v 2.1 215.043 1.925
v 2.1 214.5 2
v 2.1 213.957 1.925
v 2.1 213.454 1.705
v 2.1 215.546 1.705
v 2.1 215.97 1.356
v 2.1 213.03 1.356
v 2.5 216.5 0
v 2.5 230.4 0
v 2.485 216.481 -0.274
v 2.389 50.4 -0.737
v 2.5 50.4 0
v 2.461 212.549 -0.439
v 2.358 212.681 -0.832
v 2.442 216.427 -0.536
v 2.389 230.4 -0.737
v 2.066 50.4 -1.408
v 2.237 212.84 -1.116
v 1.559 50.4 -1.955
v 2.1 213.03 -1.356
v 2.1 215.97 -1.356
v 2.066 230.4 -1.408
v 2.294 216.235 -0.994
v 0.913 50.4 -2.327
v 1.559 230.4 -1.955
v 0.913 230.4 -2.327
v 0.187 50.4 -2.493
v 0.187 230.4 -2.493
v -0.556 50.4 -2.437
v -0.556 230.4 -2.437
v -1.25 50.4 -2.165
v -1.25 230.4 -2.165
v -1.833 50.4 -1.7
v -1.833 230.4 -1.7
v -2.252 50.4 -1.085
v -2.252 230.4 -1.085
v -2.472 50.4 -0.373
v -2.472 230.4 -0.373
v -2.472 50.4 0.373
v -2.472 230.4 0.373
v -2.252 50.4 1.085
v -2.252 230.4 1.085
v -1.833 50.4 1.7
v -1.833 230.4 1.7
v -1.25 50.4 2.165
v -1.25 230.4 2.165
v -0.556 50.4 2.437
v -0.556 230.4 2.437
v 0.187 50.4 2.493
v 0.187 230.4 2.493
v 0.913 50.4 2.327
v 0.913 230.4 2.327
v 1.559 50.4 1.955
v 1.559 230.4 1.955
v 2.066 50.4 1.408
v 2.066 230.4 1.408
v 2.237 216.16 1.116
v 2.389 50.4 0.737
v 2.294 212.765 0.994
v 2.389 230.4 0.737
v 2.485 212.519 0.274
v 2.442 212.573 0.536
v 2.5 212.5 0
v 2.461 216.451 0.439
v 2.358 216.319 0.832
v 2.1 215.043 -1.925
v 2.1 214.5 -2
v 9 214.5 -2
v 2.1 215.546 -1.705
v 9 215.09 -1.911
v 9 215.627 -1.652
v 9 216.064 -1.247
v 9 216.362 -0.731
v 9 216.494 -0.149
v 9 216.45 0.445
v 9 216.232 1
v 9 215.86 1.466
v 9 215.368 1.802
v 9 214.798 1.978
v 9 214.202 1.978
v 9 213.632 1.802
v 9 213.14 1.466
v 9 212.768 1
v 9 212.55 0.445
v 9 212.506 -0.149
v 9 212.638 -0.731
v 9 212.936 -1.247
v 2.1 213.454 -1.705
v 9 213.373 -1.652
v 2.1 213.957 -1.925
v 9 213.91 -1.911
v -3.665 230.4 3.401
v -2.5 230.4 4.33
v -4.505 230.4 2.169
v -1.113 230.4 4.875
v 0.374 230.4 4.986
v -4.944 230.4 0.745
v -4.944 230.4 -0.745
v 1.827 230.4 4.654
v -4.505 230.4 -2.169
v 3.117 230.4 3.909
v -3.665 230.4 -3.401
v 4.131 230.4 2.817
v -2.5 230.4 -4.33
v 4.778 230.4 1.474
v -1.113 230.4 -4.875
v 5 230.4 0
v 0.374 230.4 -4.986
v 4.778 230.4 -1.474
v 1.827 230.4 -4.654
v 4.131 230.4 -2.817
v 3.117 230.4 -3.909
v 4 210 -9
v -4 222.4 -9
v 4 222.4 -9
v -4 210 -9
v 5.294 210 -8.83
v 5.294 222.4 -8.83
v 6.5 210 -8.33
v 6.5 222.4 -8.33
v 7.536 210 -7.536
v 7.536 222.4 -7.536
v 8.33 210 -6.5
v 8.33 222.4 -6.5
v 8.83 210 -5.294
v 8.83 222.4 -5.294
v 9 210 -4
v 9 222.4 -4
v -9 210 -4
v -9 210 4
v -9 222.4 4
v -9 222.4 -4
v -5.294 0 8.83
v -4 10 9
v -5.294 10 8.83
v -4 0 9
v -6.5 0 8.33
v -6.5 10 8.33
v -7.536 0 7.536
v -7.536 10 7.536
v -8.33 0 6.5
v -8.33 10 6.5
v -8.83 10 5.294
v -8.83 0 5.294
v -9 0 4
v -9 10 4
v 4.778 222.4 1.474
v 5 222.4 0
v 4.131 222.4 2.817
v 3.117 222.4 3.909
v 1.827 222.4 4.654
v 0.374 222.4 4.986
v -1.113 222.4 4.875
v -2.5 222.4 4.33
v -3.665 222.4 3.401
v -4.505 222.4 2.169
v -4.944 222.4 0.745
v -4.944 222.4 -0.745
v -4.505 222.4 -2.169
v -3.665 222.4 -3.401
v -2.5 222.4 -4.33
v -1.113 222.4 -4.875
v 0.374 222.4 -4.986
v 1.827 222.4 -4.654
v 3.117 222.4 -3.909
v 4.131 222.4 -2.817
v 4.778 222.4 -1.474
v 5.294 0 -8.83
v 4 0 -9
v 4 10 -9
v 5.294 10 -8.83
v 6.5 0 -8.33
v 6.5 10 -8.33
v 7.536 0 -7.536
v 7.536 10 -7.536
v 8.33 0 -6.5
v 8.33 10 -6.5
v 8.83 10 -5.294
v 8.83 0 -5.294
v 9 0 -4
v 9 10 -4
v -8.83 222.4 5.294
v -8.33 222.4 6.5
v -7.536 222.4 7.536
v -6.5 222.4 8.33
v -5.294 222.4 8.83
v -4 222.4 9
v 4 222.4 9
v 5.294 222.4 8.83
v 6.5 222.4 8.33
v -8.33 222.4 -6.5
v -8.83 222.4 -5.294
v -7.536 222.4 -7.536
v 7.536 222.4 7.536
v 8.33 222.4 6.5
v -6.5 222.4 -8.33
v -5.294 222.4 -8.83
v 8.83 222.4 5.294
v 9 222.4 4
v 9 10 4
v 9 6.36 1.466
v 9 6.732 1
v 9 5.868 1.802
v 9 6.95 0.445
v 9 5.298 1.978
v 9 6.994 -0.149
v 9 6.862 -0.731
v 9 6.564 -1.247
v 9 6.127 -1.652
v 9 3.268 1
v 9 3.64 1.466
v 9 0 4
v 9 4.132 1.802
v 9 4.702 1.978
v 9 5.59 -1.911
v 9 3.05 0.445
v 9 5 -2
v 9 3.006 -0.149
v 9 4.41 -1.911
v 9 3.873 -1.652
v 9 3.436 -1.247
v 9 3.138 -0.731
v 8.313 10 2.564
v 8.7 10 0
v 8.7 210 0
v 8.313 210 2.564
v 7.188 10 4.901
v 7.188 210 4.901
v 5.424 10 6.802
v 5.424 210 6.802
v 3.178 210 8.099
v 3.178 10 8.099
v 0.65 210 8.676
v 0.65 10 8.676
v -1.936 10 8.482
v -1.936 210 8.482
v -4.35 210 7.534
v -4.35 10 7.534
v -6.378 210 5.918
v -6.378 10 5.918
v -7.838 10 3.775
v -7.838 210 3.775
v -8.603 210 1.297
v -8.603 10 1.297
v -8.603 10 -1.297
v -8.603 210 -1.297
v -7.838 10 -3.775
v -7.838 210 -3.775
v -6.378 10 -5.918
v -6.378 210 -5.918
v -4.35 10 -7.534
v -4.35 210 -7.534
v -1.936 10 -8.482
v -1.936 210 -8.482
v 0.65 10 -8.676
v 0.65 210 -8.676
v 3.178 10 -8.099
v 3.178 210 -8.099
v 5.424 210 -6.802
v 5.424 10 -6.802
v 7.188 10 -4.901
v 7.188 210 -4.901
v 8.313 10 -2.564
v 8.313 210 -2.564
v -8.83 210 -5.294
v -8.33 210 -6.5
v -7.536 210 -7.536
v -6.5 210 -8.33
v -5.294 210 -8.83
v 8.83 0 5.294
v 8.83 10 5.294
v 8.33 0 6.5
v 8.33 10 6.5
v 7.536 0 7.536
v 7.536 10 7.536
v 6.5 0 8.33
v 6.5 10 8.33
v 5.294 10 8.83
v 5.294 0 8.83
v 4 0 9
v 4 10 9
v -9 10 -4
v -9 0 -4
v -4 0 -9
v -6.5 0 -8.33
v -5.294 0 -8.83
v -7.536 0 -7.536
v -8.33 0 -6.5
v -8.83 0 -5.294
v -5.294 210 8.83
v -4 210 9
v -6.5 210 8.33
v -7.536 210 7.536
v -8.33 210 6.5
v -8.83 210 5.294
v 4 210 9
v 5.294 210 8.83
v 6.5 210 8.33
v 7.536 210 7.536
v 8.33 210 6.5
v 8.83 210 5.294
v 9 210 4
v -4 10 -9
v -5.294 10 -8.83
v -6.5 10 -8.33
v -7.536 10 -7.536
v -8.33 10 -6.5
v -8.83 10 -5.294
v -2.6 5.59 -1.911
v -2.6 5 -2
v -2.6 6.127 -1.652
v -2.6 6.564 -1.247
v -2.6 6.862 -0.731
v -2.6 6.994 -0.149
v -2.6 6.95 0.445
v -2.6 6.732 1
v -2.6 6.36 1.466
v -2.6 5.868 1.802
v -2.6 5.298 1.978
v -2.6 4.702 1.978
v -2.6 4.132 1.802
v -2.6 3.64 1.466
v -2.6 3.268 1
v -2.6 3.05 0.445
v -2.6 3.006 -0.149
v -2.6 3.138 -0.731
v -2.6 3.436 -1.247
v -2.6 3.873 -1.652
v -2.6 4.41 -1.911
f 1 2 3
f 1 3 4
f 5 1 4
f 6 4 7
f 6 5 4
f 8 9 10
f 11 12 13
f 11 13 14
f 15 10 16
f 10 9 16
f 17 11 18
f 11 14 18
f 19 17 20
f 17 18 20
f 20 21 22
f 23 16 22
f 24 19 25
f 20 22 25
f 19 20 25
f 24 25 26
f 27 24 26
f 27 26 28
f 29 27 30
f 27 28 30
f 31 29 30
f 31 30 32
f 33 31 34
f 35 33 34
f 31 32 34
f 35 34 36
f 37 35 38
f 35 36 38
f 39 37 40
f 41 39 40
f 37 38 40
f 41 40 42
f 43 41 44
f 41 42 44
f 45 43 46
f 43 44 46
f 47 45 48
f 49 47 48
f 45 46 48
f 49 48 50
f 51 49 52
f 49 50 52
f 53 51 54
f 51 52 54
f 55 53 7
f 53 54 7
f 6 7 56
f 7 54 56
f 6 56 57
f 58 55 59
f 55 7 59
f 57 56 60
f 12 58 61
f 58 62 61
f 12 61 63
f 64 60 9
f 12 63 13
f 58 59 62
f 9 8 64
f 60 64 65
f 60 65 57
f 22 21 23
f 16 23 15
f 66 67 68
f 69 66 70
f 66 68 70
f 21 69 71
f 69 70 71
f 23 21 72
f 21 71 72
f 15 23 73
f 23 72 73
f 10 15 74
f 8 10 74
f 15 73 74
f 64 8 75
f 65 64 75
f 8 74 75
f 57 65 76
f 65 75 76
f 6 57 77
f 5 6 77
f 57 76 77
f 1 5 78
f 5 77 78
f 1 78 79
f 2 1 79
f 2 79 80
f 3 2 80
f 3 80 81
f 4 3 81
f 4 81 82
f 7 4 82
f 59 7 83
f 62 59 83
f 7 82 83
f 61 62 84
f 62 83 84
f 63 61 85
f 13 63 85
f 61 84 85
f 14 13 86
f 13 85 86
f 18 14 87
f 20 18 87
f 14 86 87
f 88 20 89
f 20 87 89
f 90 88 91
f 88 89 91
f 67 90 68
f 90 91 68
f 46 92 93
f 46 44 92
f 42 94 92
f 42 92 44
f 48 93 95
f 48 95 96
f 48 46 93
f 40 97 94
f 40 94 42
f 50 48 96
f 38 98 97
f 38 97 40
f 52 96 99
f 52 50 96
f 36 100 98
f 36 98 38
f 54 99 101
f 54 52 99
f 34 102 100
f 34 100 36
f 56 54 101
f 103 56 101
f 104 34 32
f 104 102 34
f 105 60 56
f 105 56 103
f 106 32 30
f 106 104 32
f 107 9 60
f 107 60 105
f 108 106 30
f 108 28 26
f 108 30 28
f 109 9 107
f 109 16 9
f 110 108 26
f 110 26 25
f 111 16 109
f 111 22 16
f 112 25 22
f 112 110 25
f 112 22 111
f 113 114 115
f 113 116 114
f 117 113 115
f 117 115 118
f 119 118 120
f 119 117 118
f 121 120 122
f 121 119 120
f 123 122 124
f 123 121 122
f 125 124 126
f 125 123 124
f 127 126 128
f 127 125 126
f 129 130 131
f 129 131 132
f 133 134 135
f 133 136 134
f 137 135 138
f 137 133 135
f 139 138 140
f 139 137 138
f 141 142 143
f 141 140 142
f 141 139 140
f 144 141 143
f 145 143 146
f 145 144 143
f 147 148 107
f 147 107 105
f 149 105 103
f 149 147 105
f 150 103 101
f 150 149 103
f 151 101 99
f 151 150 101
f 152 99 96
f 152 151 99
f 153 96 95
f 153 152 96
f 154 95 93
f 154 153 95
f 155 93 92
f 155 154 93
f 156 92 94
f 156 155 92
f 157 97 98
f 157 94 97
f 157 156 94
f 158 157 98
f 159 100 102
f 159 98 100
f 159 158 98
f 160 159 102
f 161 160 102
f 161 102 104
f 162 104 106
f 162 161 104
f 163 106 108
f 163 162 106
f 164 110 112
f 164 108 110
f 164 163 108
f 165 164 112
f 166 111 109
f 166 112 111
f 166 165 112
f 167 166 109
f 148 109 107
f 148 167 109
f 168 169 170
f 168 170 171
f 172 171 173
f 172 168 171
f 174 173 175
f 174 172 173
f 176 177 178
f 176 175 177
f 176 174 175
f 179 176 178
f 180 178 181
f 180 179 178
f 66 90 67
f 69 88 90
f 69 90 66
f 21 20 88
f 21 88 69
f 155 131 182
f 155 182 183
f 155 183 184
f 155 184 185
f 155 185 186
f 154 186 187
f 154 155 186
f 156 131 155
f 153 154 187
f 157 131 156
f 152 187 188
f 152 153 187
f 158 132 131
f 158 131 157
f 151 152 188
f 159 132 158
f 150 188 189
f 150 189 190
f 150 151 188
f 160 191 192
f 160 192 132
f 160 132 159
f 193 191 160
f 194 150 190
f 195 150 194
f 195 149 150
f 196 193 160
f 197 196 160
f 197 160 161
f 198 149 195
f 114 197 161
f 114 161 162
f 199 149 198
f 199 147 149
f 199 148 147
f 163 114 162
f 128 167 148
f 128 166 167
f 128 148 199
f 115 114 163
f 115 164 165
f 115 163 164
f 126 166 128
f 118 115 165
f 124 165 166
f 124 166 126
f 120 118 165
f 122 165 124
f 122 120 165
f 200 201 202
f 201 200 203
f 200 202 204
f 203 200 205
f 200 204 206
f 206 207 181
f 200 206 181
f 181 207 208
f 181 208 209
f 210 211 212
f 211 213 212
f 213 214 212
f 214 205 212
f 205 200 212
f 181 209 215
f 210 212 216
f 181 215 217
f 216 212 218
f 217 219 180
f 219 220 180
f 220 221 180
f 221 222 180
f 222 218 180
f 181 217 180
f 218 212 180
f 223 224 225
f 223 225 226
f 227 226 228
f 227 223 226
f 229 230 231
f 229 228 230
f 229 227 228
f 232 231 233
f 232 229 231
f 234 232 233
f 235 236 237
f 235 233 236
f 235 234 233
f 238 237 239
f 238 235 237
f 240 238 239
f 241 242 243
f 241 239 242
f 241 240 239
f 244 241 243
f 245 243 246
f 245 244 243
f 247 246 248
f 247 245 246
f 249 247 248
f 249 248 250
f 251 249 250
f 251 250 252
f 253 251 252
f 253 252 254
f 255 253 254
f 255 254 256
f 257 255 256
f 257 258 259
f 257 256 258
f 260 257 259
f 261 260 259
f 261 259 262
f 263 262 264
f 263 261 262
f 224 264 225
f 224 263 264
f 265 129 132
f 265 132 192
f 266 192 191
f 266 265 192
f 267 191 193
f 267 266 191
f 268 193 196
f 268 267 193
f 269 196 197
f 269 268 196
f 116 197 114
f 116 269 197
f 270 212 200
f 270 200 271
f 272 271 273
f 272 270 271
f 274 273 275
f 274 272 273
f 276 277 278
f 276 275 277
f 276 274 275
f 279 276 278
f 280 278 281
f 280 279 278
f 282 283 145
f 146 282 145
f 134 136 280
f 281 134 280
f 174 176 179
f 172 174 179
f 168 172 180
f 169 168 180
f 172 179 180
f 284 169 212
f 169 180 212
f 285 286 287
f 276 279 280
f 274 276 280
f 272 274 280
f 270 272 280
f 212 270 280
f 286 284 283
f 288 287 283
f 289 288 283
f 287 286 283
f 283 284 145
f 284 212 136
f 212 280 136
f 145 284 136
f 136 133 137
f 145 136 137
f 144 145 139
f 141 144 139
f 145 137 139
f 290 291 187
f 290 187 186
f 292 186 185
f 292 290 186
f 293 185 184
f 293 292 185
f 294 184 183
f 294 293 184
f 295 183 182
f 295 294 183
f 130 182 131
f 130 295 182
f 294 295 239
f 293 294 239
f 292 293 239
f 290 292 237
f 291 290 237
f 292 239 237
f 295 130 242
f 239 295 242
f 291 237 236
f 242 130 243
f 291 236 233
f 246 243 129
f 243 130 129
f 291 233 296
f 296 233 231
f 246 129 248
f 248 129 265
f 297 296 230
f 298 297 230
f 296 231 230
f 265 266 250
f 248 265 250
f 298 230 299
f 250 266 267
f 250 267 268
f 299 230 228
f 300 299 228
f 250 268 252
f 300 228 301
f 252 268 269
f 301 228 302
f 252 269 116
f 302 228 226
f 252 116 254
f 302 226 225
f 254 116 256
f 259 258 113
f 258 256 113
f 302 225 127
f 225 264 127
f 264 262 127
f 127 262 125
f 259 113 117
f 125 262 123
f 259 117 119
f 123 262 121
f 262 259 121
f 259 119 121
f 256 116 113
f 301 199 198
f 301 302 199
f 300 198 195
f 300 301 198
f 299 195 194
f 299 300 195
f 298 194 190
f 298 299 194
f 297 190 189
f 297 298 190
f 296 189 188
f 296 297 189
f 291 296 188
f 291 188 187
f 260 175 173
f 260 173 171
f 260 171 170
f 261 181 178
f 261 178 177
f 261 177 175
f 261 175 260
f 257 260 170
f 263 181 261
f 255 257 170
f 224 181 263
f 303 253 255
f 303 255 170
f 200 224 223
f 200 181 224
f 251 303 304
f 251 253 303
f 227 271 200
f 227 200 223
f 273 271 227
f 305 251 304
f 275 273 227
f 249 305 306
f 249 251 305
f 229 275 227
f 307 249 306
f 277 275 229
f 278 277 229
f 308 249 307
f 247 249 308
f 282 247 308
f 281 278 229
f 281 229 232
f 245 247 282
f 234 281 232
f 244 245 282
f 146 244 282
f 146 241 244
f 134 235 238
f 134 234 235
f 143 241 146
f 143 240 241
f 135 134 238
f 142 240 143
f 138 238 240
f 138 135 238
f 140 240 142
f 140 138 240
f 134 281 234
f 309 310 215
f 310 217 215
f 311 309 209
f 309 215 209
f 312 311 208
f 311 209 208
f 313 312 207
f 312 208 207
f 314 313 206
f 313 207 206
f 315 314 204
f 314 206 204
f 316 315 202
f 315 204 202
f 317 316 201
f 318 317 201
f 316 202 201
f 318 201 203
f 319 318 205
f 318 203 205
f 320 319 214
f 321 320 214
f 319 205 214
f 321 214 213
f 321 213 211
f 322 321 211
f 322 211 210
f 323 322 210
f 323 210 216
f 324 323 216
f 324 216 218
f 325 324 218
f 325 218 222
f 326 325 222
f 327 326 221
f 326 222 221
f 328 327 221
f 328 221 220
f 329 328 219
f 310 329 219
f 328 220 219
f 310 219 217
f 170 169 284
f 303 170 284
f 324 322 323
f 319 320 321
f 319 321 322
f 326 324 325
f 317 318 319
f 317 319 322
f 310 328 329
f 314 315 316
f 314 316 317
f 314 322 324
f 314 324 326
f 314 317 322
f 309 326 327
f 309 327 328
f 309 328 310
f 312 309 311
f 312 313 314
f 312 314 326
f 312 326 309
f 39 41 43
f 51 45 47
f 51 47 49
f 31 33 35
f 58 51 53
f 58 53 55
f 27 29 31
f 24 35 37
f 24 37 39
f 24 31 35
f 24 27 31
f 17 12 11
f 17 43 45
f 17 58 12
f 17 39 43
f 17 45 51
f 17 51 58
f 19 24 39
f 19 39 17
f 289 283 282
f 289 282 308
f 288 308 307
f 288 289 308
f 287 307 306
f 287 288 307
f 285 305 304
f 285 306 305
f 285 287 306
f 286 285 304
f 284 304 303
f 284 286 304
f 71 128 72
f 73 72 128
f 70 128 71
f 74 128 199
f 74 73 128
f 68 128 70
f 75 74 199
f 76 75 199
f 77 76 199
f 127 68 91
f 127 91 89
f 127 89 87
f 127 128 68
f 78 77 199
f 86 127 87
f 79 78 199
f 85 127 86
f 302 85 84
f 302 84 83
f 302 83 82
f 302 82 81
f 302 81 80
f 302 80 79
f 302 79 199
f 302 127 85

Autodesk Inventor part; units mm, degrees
ref_plane "YZ Plane" through (0, 0, 0) normal (1, 0, 0) x (0, 1, 0)
ref_plane "XZ Plane" through (0, 0, 0) normal (0, 1, 0) x (-1, 0, 0)
ref_plane "XY Plane" through (0, 0, 0) normal (0, 0, 1) x (1, 0, 0)
sketch "スケッチ1" plane through (0, 0, 0) normal (0, 1, 0) x (-1, 0, 0)
  line L0 (-4, -9) -> (4, -9)
  line L1 (9, -4) -> (9, 4)
  line L2 (4, 9) -> (-4, 9)
  line L3 (-9, 4) -> (-9, -4)
  arc A0 (9, 4) -> (4, 9) centre (4, 4) ccw
  arc A1 (-4, 9) -> (-9, 4) centre (-4, 4) ccw
  arc A2 (-9, -4) -> (-4, -9) centre (-4, -4) ccw
  arc A3 (4, -9) -> (9, -4) centre (4, -4) ccw
  point P0 (0, 0)
  point P1 (9, 0)
  point P2 (0, -9)
  point P3 (9, 4)
  point P4 (9, -4)
  point P5 (4, 9)
  point P6 (-4, 9)
  point P7 (-9, -4)
  point P8 (4, -9)
  dimension "d0" = 5
extrude "押し出し1" add sketch "スケッチ1" along normal blind 10
sketch "スケッチ2" plane through (0, 10, 0) normal (0, 1, 0) x (1, 0, 0)
  circle A0 centre (0, 0) radius 8.7
  dimension "d3" = 17.4
extrude "押し出し2" add sketch "スケッチ2" along normal blind 200
sketch "スケッチ3" plane through (0, 210, 0) normal (0, 1, 0) x (1, 0, 0)
  point P0 (0, 0)
sketch "スケッチ4" plane through (0, 210, 0) normal (0, 1, 0) x (1, 0, 0)
  line L0 (-4, 9) -> (4, 9)
  line L1 (4, 9) -> (-4, 9) projected
  line L2 (9, 4) -> (9, -4)
  line L3 (4, -9) -> (-4, -9)
  line L4 (-9, -4) -> (-9, 4)
  arc A0 (-9, -4) -> (-4, -9) centre (-4, -4) ccw
  arc A1 (-4, 9) -> (-9, 4) centre (-4, 4) ccw
  arc A2 (9, 4) -> (4, 9) centre (4, 4) ccw
  arc A3 (4, -9) -> (9, -4) centre (4, -4) ccw
  point P0 (0, 0)
  point P1 (-9, 9)
  point P2 (9, 9)
  dimension "d6" = 18
  dimension "d7" = 5
extrude "押し出し3" add sketch "スケッチ4" along normal blind 12.4
sketch "スケッチ5" plane through (0, 222.4, 0) normal (0, 1, 0) x (1, 0, 0)
  circle A0 centre (0, 0) radius 5
  dimension "d10" = 10
extrude "押し出し4" add sketch "スケッチ5" along normal blind 8
sketch "スケッチ6" plane through (0, 230.4, 0) normal (0, 1, 0) x (1, 0, 0)
  circle A0 centre (0, 0) radius 2.5
  dimension "d13" = 5
extrude "押し出し5" cut sketch "スケッチ6" against normal blind 180
sketch "スケッチ7" plane through (9, 0, 4) normal (1, 0, 0) x (0, 0, -1)
  line L0 (4, 0) -> (4, 10)
  line L1 (0, 10) -> (8, 10) projected
  circle A0 centre (4, 5) radius 2
  dimension "d16" = 4
extrude "押し出し6" cut sketch "スケッチ7" against normal blind 11.6
sketch "スケッチ8" plane through (9, 210, 4) normal (1, 0, 0) x (0, 0, -1)
  line L0 (0, 0) -> (8, 0) projected
  line L1 (4, 0) -> (4, 12.4)
  line L2 (-1, 12.4) -> (9, 12.4) projected
  circle A0 centre (4, 4.5) radius 2
  point P0 (4, -210)
  dimension "d19" = 4.5
  dimension "d20" = 4
extrude "押し出し7" cut sketch "スケッチ8" against normal blind 6.9
properties part number "SMC_CJ2B16-175(本体)"
